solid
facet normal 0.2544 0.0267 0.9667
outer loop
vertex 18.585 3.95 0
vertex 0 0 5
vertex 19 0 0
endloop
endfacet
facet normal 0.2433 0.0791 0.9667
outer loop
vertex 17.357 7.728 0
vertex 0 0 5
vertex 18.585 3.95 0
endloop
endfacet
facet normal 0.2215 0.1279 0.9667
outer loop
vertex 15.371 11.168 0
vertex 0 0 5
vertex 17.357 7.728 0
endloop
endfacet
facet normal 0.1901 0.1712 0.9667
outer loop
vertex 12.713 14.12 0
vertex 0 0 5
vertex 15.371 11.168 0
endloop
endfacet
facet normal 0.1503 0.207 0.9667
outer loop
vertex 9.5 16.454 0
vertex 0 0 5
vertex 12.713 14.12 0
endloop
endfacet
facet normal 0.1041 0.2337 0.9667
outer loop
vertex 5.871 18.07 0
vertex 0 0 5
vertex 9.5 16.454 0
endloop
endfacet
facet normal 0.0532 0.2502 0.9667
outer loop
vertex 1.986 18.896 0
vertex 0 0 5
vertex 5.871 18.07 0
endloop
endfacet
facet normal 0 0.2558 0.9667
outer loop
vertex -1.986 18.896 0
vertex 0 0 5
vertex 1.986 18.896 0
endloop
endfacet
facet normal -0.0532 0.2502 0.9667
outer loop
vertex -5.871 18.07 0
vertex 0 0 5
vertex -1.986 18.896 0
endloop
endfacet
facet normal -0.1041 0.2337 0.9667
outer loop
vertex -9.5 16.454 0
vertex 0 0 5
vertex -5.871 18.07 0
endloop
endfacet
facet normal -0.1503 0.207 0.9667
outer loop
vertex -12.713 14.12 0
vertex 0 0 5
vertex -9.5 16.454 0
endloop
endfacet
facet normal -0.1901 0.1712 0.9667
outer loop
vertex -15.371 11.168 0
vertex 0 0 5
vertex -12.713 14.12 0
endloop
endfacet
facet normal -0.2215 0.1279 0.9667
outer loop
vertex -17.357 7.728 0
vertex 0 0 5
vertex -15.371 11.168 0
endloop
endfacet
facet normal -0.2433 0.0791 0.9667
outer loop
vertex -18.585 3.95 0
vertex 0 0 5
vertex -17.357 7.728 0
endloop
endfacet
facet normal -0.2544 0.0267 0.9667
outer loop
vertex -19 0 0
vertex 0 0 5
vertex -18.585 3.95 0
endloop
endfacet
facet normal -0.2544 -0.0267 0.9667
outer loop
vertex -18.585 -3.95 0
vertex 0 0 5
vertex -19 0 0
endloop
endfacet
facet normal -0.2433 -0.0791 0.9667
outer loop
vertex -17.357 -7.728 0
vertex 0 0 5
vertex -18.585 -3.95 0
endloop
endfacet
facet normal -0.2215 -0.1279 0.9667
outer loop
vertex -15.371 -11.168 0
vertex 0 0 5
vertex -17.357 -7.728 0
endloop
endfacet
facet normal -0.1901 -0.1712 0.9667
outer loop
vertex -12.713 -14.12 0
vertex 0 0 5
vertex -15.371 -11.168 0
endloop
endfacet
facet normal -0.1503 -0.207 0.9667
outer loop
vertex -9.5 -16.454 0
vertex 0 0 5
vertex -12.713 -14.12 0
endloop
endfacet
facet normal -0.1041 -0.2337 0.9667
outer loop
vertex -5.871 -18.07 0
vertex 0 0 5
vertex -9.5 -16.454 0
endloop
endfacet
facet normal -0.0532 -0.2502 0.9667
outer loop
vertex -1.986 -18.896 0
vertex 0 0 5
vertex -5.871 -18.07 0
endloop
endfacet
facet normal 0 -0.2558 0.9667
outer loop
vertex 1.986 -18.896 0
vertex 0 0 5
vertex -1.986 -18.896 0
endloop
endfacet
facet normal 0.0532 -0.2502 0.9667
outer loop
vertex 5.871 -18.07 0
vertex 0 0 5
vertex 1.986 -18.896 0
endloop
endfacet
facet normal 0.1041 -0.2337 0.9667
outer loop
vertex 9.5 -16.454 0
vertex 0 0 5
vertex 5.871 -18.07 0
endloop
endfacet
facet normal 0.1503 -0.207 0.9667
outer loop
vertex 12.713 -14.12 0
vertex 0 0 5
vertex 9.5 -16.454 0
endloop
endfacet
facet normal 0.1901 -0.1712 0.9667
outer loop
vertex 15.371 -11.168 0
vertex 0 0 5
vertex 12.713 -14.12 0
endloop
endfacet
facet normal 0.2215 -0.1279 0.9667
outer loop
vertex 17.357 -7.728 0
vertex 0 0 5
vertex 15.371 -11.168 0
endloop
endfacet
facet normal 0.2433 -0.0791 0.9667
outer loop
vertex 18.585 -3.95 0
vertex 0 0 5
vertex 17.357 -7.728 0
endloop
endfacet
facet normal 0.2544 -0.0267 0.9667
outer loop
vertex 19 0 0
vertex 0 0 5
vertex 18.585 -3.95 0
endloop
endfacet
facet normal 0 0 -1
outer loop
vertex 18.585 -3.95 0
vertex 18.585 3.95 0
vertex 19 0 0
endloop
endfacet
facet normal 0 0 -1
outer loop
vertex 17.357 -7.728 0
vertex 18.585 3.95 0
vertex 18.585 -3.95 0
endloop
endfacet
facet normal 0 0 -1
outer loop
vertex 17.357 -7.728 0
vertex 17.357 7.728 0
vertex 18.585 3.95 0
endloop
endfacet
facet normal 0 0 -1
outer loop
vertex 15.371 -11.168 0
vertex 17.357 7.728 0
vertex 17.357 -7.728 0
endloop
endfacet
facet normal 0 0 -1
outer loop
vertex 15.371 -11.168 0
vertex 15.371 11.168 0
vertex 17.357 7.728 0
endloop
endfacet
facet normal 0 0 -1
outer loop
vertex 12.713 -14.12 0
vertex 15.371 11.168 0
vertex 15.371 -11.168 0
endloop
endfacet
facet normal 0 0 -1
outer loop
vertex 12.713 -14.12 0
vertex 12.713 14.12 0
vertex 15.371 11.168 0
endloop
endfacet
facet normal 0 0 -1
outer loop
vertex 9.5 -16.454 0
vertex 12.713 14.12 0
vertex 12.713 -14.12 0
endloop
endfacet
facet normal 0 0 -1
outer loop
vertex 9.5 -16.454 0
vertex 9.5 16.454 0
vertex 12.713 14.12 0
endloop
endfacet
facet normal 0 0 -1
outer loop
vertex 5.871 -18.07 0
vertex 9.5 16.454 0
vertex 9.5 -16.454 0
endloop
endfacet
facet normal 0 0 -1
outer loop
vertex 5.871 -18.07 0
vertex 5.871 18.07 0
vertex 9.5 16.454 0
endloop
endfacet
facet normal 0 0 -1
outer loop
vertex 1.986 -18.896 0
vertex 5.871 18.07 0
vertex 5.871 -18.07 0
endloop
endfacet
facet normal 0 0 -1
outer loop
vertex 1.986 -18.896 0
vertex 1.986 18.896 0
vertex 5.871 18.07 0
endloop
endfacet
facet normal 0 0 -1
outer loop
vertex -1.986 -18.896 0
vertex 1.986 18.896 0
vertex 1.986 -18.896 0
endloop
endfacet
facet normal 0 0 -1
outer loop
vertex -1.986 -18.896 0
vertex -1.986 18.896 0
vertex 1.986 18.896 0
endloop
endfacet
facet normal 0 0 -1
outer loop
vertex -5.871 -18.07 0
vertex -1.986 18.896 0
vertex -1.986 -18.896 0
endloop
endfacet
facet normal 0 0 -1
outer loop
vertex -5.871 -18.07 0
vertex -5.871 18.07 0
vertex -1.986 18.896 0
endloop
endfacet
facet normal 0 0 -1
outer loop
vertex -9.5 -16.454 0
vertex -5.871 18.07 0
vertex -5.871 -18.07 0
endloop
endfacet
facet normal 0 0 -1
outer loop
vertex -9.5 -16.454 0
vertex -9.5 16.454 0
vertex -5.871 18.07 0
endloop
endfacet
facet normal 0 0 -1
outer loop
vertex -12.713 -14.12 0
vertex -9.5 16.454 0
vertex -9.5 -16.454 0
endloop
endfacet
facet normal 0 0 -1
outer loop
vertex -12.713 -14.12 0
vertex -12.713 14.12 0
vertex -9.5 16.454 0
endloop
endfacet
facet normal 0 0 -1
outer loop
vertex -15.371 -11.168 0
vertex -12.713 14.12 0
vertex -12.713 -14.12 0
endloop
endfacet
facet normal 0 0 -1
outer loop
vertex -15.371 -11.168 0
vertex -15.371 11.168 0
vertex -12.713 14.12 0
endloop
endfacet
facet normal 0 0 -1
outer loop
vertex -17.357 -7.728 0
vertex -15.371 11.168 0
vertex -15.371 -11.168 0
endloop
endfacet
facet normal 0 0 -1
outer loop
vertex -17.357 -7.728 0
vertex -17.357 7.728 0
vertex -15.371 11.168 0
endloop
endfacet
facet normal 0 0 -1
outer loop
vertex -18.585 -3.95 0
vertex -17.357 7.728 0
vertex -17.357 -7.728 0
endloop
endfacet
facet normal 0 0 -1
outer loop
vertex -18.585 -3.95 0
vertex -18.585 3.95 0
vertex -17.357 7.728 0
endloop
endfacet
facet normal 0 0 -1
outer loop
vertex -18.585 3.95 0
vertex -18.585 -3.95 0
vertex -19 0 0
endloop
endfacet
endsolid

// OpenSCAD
// Generated by SolidPython 1.0.1 on 2020-07-29 00:39:25


cylinder(h = 5, r1 = 19, r2 = 0);
/***********************************************
*********      SolidPython code:      **********
************************************************
 
# import packages: SolidPython
from solid import *
from solid.utils import *
from itertools import chain, combinations


class Resize:

    def __init__(self, scad_file):
        self.scad_file = scad_file
        #self.scad_file = import_scad(scad_file)
        # cone/cylinder param:
        self.r1 = 0
        self.r2 = 0
        self.h = 0
        # rectangular prism param:
        self.w = 0
        self.l = 0
        # ellipse param:
        self.r = 0

    # import OpenScad code (file name corresponds to shape)


    # classify shape + parameters
    def assign(self, param1, param2, param3):
        if self.scad_file == 'cone.scad':
            self.r1 = param1
            self.r2 = param2
            self.h = param3
        elif self.scad_file == 'cylinder.scad':
            self.r1 = param1
            self.r2 = param2
            self.h = param3
        elif self.scad_file == 'rectangularPrism.scad':
            self.h = param1
            self.l = param2
            self.w = param3
        else:
            self.r = param1
            self.h = param2

    # resize parameters
    def iterate(self):
        x = range(3, 20, 2)
        i = 1
        if self.scad_file == 'cone.scad':
            tempList = list(combinations(x, 2))
            for temp in tempList:
                param1 = temp[0]
                param2 = temp[1]
                filepath = 'produced_scad_files/' + 'cone' + str(param1) + '_' + str(param2) + '_' + '.scad'
                scad_render_to_file(cylinder(h=param1, r1=param2, r2=0), filepath)

        elif self.scad_file == 'cylinder.scad':
            tempList = list(combinations(x, 3))
            for temp in tempList:
                param1 = temp[0]
                param2 = temp[1]
                filepath = 'produced_scad_files/' + 'cylinder' + str(param1) + '_' + str(param2) + '_' + '.scad'
                scad_render_to_file(cylinder(h=param1, r1=param2, r2=param2), filepath)

        elif self.scad_file == 'rectangularPrism.scad':
            tempList = list(combinations(x, 3))
            for temp in tempList:
                param1 = temp[0]
                param2 = temp[1]
                param3 = temp[2]
                filepath = 'produced_scad_files/' + 'rectangularPrism' + str(param1) + '_' + str(param2) + '_' + str(
                    param3) + '.scad'
                scad_render_to_file(cube(size=(param1, param2, param3)), filepath)

        elif self.scad_file == 'ellipse.scad':
            tempList = list(combinations(x, 4))
            for temp in tempList:
                param1 = temp[0]
                param2 = temp[1]
                param3 = temp[2]
                param4 = temp[3]
                filepath = 'produced_scad_files/' + 'ellipse' + str(param1) + '_' + str(param2) + '_' + str(param3) + '_' + str(param4) + '.scad'
                scad_render_to_file(scale([param1, param2, param3])(sphere(r=param4)), filepath)

    def render_to_scadfile(self):
        scad_render_to_file(scad, 'example.scad') 
 
************************************************/
